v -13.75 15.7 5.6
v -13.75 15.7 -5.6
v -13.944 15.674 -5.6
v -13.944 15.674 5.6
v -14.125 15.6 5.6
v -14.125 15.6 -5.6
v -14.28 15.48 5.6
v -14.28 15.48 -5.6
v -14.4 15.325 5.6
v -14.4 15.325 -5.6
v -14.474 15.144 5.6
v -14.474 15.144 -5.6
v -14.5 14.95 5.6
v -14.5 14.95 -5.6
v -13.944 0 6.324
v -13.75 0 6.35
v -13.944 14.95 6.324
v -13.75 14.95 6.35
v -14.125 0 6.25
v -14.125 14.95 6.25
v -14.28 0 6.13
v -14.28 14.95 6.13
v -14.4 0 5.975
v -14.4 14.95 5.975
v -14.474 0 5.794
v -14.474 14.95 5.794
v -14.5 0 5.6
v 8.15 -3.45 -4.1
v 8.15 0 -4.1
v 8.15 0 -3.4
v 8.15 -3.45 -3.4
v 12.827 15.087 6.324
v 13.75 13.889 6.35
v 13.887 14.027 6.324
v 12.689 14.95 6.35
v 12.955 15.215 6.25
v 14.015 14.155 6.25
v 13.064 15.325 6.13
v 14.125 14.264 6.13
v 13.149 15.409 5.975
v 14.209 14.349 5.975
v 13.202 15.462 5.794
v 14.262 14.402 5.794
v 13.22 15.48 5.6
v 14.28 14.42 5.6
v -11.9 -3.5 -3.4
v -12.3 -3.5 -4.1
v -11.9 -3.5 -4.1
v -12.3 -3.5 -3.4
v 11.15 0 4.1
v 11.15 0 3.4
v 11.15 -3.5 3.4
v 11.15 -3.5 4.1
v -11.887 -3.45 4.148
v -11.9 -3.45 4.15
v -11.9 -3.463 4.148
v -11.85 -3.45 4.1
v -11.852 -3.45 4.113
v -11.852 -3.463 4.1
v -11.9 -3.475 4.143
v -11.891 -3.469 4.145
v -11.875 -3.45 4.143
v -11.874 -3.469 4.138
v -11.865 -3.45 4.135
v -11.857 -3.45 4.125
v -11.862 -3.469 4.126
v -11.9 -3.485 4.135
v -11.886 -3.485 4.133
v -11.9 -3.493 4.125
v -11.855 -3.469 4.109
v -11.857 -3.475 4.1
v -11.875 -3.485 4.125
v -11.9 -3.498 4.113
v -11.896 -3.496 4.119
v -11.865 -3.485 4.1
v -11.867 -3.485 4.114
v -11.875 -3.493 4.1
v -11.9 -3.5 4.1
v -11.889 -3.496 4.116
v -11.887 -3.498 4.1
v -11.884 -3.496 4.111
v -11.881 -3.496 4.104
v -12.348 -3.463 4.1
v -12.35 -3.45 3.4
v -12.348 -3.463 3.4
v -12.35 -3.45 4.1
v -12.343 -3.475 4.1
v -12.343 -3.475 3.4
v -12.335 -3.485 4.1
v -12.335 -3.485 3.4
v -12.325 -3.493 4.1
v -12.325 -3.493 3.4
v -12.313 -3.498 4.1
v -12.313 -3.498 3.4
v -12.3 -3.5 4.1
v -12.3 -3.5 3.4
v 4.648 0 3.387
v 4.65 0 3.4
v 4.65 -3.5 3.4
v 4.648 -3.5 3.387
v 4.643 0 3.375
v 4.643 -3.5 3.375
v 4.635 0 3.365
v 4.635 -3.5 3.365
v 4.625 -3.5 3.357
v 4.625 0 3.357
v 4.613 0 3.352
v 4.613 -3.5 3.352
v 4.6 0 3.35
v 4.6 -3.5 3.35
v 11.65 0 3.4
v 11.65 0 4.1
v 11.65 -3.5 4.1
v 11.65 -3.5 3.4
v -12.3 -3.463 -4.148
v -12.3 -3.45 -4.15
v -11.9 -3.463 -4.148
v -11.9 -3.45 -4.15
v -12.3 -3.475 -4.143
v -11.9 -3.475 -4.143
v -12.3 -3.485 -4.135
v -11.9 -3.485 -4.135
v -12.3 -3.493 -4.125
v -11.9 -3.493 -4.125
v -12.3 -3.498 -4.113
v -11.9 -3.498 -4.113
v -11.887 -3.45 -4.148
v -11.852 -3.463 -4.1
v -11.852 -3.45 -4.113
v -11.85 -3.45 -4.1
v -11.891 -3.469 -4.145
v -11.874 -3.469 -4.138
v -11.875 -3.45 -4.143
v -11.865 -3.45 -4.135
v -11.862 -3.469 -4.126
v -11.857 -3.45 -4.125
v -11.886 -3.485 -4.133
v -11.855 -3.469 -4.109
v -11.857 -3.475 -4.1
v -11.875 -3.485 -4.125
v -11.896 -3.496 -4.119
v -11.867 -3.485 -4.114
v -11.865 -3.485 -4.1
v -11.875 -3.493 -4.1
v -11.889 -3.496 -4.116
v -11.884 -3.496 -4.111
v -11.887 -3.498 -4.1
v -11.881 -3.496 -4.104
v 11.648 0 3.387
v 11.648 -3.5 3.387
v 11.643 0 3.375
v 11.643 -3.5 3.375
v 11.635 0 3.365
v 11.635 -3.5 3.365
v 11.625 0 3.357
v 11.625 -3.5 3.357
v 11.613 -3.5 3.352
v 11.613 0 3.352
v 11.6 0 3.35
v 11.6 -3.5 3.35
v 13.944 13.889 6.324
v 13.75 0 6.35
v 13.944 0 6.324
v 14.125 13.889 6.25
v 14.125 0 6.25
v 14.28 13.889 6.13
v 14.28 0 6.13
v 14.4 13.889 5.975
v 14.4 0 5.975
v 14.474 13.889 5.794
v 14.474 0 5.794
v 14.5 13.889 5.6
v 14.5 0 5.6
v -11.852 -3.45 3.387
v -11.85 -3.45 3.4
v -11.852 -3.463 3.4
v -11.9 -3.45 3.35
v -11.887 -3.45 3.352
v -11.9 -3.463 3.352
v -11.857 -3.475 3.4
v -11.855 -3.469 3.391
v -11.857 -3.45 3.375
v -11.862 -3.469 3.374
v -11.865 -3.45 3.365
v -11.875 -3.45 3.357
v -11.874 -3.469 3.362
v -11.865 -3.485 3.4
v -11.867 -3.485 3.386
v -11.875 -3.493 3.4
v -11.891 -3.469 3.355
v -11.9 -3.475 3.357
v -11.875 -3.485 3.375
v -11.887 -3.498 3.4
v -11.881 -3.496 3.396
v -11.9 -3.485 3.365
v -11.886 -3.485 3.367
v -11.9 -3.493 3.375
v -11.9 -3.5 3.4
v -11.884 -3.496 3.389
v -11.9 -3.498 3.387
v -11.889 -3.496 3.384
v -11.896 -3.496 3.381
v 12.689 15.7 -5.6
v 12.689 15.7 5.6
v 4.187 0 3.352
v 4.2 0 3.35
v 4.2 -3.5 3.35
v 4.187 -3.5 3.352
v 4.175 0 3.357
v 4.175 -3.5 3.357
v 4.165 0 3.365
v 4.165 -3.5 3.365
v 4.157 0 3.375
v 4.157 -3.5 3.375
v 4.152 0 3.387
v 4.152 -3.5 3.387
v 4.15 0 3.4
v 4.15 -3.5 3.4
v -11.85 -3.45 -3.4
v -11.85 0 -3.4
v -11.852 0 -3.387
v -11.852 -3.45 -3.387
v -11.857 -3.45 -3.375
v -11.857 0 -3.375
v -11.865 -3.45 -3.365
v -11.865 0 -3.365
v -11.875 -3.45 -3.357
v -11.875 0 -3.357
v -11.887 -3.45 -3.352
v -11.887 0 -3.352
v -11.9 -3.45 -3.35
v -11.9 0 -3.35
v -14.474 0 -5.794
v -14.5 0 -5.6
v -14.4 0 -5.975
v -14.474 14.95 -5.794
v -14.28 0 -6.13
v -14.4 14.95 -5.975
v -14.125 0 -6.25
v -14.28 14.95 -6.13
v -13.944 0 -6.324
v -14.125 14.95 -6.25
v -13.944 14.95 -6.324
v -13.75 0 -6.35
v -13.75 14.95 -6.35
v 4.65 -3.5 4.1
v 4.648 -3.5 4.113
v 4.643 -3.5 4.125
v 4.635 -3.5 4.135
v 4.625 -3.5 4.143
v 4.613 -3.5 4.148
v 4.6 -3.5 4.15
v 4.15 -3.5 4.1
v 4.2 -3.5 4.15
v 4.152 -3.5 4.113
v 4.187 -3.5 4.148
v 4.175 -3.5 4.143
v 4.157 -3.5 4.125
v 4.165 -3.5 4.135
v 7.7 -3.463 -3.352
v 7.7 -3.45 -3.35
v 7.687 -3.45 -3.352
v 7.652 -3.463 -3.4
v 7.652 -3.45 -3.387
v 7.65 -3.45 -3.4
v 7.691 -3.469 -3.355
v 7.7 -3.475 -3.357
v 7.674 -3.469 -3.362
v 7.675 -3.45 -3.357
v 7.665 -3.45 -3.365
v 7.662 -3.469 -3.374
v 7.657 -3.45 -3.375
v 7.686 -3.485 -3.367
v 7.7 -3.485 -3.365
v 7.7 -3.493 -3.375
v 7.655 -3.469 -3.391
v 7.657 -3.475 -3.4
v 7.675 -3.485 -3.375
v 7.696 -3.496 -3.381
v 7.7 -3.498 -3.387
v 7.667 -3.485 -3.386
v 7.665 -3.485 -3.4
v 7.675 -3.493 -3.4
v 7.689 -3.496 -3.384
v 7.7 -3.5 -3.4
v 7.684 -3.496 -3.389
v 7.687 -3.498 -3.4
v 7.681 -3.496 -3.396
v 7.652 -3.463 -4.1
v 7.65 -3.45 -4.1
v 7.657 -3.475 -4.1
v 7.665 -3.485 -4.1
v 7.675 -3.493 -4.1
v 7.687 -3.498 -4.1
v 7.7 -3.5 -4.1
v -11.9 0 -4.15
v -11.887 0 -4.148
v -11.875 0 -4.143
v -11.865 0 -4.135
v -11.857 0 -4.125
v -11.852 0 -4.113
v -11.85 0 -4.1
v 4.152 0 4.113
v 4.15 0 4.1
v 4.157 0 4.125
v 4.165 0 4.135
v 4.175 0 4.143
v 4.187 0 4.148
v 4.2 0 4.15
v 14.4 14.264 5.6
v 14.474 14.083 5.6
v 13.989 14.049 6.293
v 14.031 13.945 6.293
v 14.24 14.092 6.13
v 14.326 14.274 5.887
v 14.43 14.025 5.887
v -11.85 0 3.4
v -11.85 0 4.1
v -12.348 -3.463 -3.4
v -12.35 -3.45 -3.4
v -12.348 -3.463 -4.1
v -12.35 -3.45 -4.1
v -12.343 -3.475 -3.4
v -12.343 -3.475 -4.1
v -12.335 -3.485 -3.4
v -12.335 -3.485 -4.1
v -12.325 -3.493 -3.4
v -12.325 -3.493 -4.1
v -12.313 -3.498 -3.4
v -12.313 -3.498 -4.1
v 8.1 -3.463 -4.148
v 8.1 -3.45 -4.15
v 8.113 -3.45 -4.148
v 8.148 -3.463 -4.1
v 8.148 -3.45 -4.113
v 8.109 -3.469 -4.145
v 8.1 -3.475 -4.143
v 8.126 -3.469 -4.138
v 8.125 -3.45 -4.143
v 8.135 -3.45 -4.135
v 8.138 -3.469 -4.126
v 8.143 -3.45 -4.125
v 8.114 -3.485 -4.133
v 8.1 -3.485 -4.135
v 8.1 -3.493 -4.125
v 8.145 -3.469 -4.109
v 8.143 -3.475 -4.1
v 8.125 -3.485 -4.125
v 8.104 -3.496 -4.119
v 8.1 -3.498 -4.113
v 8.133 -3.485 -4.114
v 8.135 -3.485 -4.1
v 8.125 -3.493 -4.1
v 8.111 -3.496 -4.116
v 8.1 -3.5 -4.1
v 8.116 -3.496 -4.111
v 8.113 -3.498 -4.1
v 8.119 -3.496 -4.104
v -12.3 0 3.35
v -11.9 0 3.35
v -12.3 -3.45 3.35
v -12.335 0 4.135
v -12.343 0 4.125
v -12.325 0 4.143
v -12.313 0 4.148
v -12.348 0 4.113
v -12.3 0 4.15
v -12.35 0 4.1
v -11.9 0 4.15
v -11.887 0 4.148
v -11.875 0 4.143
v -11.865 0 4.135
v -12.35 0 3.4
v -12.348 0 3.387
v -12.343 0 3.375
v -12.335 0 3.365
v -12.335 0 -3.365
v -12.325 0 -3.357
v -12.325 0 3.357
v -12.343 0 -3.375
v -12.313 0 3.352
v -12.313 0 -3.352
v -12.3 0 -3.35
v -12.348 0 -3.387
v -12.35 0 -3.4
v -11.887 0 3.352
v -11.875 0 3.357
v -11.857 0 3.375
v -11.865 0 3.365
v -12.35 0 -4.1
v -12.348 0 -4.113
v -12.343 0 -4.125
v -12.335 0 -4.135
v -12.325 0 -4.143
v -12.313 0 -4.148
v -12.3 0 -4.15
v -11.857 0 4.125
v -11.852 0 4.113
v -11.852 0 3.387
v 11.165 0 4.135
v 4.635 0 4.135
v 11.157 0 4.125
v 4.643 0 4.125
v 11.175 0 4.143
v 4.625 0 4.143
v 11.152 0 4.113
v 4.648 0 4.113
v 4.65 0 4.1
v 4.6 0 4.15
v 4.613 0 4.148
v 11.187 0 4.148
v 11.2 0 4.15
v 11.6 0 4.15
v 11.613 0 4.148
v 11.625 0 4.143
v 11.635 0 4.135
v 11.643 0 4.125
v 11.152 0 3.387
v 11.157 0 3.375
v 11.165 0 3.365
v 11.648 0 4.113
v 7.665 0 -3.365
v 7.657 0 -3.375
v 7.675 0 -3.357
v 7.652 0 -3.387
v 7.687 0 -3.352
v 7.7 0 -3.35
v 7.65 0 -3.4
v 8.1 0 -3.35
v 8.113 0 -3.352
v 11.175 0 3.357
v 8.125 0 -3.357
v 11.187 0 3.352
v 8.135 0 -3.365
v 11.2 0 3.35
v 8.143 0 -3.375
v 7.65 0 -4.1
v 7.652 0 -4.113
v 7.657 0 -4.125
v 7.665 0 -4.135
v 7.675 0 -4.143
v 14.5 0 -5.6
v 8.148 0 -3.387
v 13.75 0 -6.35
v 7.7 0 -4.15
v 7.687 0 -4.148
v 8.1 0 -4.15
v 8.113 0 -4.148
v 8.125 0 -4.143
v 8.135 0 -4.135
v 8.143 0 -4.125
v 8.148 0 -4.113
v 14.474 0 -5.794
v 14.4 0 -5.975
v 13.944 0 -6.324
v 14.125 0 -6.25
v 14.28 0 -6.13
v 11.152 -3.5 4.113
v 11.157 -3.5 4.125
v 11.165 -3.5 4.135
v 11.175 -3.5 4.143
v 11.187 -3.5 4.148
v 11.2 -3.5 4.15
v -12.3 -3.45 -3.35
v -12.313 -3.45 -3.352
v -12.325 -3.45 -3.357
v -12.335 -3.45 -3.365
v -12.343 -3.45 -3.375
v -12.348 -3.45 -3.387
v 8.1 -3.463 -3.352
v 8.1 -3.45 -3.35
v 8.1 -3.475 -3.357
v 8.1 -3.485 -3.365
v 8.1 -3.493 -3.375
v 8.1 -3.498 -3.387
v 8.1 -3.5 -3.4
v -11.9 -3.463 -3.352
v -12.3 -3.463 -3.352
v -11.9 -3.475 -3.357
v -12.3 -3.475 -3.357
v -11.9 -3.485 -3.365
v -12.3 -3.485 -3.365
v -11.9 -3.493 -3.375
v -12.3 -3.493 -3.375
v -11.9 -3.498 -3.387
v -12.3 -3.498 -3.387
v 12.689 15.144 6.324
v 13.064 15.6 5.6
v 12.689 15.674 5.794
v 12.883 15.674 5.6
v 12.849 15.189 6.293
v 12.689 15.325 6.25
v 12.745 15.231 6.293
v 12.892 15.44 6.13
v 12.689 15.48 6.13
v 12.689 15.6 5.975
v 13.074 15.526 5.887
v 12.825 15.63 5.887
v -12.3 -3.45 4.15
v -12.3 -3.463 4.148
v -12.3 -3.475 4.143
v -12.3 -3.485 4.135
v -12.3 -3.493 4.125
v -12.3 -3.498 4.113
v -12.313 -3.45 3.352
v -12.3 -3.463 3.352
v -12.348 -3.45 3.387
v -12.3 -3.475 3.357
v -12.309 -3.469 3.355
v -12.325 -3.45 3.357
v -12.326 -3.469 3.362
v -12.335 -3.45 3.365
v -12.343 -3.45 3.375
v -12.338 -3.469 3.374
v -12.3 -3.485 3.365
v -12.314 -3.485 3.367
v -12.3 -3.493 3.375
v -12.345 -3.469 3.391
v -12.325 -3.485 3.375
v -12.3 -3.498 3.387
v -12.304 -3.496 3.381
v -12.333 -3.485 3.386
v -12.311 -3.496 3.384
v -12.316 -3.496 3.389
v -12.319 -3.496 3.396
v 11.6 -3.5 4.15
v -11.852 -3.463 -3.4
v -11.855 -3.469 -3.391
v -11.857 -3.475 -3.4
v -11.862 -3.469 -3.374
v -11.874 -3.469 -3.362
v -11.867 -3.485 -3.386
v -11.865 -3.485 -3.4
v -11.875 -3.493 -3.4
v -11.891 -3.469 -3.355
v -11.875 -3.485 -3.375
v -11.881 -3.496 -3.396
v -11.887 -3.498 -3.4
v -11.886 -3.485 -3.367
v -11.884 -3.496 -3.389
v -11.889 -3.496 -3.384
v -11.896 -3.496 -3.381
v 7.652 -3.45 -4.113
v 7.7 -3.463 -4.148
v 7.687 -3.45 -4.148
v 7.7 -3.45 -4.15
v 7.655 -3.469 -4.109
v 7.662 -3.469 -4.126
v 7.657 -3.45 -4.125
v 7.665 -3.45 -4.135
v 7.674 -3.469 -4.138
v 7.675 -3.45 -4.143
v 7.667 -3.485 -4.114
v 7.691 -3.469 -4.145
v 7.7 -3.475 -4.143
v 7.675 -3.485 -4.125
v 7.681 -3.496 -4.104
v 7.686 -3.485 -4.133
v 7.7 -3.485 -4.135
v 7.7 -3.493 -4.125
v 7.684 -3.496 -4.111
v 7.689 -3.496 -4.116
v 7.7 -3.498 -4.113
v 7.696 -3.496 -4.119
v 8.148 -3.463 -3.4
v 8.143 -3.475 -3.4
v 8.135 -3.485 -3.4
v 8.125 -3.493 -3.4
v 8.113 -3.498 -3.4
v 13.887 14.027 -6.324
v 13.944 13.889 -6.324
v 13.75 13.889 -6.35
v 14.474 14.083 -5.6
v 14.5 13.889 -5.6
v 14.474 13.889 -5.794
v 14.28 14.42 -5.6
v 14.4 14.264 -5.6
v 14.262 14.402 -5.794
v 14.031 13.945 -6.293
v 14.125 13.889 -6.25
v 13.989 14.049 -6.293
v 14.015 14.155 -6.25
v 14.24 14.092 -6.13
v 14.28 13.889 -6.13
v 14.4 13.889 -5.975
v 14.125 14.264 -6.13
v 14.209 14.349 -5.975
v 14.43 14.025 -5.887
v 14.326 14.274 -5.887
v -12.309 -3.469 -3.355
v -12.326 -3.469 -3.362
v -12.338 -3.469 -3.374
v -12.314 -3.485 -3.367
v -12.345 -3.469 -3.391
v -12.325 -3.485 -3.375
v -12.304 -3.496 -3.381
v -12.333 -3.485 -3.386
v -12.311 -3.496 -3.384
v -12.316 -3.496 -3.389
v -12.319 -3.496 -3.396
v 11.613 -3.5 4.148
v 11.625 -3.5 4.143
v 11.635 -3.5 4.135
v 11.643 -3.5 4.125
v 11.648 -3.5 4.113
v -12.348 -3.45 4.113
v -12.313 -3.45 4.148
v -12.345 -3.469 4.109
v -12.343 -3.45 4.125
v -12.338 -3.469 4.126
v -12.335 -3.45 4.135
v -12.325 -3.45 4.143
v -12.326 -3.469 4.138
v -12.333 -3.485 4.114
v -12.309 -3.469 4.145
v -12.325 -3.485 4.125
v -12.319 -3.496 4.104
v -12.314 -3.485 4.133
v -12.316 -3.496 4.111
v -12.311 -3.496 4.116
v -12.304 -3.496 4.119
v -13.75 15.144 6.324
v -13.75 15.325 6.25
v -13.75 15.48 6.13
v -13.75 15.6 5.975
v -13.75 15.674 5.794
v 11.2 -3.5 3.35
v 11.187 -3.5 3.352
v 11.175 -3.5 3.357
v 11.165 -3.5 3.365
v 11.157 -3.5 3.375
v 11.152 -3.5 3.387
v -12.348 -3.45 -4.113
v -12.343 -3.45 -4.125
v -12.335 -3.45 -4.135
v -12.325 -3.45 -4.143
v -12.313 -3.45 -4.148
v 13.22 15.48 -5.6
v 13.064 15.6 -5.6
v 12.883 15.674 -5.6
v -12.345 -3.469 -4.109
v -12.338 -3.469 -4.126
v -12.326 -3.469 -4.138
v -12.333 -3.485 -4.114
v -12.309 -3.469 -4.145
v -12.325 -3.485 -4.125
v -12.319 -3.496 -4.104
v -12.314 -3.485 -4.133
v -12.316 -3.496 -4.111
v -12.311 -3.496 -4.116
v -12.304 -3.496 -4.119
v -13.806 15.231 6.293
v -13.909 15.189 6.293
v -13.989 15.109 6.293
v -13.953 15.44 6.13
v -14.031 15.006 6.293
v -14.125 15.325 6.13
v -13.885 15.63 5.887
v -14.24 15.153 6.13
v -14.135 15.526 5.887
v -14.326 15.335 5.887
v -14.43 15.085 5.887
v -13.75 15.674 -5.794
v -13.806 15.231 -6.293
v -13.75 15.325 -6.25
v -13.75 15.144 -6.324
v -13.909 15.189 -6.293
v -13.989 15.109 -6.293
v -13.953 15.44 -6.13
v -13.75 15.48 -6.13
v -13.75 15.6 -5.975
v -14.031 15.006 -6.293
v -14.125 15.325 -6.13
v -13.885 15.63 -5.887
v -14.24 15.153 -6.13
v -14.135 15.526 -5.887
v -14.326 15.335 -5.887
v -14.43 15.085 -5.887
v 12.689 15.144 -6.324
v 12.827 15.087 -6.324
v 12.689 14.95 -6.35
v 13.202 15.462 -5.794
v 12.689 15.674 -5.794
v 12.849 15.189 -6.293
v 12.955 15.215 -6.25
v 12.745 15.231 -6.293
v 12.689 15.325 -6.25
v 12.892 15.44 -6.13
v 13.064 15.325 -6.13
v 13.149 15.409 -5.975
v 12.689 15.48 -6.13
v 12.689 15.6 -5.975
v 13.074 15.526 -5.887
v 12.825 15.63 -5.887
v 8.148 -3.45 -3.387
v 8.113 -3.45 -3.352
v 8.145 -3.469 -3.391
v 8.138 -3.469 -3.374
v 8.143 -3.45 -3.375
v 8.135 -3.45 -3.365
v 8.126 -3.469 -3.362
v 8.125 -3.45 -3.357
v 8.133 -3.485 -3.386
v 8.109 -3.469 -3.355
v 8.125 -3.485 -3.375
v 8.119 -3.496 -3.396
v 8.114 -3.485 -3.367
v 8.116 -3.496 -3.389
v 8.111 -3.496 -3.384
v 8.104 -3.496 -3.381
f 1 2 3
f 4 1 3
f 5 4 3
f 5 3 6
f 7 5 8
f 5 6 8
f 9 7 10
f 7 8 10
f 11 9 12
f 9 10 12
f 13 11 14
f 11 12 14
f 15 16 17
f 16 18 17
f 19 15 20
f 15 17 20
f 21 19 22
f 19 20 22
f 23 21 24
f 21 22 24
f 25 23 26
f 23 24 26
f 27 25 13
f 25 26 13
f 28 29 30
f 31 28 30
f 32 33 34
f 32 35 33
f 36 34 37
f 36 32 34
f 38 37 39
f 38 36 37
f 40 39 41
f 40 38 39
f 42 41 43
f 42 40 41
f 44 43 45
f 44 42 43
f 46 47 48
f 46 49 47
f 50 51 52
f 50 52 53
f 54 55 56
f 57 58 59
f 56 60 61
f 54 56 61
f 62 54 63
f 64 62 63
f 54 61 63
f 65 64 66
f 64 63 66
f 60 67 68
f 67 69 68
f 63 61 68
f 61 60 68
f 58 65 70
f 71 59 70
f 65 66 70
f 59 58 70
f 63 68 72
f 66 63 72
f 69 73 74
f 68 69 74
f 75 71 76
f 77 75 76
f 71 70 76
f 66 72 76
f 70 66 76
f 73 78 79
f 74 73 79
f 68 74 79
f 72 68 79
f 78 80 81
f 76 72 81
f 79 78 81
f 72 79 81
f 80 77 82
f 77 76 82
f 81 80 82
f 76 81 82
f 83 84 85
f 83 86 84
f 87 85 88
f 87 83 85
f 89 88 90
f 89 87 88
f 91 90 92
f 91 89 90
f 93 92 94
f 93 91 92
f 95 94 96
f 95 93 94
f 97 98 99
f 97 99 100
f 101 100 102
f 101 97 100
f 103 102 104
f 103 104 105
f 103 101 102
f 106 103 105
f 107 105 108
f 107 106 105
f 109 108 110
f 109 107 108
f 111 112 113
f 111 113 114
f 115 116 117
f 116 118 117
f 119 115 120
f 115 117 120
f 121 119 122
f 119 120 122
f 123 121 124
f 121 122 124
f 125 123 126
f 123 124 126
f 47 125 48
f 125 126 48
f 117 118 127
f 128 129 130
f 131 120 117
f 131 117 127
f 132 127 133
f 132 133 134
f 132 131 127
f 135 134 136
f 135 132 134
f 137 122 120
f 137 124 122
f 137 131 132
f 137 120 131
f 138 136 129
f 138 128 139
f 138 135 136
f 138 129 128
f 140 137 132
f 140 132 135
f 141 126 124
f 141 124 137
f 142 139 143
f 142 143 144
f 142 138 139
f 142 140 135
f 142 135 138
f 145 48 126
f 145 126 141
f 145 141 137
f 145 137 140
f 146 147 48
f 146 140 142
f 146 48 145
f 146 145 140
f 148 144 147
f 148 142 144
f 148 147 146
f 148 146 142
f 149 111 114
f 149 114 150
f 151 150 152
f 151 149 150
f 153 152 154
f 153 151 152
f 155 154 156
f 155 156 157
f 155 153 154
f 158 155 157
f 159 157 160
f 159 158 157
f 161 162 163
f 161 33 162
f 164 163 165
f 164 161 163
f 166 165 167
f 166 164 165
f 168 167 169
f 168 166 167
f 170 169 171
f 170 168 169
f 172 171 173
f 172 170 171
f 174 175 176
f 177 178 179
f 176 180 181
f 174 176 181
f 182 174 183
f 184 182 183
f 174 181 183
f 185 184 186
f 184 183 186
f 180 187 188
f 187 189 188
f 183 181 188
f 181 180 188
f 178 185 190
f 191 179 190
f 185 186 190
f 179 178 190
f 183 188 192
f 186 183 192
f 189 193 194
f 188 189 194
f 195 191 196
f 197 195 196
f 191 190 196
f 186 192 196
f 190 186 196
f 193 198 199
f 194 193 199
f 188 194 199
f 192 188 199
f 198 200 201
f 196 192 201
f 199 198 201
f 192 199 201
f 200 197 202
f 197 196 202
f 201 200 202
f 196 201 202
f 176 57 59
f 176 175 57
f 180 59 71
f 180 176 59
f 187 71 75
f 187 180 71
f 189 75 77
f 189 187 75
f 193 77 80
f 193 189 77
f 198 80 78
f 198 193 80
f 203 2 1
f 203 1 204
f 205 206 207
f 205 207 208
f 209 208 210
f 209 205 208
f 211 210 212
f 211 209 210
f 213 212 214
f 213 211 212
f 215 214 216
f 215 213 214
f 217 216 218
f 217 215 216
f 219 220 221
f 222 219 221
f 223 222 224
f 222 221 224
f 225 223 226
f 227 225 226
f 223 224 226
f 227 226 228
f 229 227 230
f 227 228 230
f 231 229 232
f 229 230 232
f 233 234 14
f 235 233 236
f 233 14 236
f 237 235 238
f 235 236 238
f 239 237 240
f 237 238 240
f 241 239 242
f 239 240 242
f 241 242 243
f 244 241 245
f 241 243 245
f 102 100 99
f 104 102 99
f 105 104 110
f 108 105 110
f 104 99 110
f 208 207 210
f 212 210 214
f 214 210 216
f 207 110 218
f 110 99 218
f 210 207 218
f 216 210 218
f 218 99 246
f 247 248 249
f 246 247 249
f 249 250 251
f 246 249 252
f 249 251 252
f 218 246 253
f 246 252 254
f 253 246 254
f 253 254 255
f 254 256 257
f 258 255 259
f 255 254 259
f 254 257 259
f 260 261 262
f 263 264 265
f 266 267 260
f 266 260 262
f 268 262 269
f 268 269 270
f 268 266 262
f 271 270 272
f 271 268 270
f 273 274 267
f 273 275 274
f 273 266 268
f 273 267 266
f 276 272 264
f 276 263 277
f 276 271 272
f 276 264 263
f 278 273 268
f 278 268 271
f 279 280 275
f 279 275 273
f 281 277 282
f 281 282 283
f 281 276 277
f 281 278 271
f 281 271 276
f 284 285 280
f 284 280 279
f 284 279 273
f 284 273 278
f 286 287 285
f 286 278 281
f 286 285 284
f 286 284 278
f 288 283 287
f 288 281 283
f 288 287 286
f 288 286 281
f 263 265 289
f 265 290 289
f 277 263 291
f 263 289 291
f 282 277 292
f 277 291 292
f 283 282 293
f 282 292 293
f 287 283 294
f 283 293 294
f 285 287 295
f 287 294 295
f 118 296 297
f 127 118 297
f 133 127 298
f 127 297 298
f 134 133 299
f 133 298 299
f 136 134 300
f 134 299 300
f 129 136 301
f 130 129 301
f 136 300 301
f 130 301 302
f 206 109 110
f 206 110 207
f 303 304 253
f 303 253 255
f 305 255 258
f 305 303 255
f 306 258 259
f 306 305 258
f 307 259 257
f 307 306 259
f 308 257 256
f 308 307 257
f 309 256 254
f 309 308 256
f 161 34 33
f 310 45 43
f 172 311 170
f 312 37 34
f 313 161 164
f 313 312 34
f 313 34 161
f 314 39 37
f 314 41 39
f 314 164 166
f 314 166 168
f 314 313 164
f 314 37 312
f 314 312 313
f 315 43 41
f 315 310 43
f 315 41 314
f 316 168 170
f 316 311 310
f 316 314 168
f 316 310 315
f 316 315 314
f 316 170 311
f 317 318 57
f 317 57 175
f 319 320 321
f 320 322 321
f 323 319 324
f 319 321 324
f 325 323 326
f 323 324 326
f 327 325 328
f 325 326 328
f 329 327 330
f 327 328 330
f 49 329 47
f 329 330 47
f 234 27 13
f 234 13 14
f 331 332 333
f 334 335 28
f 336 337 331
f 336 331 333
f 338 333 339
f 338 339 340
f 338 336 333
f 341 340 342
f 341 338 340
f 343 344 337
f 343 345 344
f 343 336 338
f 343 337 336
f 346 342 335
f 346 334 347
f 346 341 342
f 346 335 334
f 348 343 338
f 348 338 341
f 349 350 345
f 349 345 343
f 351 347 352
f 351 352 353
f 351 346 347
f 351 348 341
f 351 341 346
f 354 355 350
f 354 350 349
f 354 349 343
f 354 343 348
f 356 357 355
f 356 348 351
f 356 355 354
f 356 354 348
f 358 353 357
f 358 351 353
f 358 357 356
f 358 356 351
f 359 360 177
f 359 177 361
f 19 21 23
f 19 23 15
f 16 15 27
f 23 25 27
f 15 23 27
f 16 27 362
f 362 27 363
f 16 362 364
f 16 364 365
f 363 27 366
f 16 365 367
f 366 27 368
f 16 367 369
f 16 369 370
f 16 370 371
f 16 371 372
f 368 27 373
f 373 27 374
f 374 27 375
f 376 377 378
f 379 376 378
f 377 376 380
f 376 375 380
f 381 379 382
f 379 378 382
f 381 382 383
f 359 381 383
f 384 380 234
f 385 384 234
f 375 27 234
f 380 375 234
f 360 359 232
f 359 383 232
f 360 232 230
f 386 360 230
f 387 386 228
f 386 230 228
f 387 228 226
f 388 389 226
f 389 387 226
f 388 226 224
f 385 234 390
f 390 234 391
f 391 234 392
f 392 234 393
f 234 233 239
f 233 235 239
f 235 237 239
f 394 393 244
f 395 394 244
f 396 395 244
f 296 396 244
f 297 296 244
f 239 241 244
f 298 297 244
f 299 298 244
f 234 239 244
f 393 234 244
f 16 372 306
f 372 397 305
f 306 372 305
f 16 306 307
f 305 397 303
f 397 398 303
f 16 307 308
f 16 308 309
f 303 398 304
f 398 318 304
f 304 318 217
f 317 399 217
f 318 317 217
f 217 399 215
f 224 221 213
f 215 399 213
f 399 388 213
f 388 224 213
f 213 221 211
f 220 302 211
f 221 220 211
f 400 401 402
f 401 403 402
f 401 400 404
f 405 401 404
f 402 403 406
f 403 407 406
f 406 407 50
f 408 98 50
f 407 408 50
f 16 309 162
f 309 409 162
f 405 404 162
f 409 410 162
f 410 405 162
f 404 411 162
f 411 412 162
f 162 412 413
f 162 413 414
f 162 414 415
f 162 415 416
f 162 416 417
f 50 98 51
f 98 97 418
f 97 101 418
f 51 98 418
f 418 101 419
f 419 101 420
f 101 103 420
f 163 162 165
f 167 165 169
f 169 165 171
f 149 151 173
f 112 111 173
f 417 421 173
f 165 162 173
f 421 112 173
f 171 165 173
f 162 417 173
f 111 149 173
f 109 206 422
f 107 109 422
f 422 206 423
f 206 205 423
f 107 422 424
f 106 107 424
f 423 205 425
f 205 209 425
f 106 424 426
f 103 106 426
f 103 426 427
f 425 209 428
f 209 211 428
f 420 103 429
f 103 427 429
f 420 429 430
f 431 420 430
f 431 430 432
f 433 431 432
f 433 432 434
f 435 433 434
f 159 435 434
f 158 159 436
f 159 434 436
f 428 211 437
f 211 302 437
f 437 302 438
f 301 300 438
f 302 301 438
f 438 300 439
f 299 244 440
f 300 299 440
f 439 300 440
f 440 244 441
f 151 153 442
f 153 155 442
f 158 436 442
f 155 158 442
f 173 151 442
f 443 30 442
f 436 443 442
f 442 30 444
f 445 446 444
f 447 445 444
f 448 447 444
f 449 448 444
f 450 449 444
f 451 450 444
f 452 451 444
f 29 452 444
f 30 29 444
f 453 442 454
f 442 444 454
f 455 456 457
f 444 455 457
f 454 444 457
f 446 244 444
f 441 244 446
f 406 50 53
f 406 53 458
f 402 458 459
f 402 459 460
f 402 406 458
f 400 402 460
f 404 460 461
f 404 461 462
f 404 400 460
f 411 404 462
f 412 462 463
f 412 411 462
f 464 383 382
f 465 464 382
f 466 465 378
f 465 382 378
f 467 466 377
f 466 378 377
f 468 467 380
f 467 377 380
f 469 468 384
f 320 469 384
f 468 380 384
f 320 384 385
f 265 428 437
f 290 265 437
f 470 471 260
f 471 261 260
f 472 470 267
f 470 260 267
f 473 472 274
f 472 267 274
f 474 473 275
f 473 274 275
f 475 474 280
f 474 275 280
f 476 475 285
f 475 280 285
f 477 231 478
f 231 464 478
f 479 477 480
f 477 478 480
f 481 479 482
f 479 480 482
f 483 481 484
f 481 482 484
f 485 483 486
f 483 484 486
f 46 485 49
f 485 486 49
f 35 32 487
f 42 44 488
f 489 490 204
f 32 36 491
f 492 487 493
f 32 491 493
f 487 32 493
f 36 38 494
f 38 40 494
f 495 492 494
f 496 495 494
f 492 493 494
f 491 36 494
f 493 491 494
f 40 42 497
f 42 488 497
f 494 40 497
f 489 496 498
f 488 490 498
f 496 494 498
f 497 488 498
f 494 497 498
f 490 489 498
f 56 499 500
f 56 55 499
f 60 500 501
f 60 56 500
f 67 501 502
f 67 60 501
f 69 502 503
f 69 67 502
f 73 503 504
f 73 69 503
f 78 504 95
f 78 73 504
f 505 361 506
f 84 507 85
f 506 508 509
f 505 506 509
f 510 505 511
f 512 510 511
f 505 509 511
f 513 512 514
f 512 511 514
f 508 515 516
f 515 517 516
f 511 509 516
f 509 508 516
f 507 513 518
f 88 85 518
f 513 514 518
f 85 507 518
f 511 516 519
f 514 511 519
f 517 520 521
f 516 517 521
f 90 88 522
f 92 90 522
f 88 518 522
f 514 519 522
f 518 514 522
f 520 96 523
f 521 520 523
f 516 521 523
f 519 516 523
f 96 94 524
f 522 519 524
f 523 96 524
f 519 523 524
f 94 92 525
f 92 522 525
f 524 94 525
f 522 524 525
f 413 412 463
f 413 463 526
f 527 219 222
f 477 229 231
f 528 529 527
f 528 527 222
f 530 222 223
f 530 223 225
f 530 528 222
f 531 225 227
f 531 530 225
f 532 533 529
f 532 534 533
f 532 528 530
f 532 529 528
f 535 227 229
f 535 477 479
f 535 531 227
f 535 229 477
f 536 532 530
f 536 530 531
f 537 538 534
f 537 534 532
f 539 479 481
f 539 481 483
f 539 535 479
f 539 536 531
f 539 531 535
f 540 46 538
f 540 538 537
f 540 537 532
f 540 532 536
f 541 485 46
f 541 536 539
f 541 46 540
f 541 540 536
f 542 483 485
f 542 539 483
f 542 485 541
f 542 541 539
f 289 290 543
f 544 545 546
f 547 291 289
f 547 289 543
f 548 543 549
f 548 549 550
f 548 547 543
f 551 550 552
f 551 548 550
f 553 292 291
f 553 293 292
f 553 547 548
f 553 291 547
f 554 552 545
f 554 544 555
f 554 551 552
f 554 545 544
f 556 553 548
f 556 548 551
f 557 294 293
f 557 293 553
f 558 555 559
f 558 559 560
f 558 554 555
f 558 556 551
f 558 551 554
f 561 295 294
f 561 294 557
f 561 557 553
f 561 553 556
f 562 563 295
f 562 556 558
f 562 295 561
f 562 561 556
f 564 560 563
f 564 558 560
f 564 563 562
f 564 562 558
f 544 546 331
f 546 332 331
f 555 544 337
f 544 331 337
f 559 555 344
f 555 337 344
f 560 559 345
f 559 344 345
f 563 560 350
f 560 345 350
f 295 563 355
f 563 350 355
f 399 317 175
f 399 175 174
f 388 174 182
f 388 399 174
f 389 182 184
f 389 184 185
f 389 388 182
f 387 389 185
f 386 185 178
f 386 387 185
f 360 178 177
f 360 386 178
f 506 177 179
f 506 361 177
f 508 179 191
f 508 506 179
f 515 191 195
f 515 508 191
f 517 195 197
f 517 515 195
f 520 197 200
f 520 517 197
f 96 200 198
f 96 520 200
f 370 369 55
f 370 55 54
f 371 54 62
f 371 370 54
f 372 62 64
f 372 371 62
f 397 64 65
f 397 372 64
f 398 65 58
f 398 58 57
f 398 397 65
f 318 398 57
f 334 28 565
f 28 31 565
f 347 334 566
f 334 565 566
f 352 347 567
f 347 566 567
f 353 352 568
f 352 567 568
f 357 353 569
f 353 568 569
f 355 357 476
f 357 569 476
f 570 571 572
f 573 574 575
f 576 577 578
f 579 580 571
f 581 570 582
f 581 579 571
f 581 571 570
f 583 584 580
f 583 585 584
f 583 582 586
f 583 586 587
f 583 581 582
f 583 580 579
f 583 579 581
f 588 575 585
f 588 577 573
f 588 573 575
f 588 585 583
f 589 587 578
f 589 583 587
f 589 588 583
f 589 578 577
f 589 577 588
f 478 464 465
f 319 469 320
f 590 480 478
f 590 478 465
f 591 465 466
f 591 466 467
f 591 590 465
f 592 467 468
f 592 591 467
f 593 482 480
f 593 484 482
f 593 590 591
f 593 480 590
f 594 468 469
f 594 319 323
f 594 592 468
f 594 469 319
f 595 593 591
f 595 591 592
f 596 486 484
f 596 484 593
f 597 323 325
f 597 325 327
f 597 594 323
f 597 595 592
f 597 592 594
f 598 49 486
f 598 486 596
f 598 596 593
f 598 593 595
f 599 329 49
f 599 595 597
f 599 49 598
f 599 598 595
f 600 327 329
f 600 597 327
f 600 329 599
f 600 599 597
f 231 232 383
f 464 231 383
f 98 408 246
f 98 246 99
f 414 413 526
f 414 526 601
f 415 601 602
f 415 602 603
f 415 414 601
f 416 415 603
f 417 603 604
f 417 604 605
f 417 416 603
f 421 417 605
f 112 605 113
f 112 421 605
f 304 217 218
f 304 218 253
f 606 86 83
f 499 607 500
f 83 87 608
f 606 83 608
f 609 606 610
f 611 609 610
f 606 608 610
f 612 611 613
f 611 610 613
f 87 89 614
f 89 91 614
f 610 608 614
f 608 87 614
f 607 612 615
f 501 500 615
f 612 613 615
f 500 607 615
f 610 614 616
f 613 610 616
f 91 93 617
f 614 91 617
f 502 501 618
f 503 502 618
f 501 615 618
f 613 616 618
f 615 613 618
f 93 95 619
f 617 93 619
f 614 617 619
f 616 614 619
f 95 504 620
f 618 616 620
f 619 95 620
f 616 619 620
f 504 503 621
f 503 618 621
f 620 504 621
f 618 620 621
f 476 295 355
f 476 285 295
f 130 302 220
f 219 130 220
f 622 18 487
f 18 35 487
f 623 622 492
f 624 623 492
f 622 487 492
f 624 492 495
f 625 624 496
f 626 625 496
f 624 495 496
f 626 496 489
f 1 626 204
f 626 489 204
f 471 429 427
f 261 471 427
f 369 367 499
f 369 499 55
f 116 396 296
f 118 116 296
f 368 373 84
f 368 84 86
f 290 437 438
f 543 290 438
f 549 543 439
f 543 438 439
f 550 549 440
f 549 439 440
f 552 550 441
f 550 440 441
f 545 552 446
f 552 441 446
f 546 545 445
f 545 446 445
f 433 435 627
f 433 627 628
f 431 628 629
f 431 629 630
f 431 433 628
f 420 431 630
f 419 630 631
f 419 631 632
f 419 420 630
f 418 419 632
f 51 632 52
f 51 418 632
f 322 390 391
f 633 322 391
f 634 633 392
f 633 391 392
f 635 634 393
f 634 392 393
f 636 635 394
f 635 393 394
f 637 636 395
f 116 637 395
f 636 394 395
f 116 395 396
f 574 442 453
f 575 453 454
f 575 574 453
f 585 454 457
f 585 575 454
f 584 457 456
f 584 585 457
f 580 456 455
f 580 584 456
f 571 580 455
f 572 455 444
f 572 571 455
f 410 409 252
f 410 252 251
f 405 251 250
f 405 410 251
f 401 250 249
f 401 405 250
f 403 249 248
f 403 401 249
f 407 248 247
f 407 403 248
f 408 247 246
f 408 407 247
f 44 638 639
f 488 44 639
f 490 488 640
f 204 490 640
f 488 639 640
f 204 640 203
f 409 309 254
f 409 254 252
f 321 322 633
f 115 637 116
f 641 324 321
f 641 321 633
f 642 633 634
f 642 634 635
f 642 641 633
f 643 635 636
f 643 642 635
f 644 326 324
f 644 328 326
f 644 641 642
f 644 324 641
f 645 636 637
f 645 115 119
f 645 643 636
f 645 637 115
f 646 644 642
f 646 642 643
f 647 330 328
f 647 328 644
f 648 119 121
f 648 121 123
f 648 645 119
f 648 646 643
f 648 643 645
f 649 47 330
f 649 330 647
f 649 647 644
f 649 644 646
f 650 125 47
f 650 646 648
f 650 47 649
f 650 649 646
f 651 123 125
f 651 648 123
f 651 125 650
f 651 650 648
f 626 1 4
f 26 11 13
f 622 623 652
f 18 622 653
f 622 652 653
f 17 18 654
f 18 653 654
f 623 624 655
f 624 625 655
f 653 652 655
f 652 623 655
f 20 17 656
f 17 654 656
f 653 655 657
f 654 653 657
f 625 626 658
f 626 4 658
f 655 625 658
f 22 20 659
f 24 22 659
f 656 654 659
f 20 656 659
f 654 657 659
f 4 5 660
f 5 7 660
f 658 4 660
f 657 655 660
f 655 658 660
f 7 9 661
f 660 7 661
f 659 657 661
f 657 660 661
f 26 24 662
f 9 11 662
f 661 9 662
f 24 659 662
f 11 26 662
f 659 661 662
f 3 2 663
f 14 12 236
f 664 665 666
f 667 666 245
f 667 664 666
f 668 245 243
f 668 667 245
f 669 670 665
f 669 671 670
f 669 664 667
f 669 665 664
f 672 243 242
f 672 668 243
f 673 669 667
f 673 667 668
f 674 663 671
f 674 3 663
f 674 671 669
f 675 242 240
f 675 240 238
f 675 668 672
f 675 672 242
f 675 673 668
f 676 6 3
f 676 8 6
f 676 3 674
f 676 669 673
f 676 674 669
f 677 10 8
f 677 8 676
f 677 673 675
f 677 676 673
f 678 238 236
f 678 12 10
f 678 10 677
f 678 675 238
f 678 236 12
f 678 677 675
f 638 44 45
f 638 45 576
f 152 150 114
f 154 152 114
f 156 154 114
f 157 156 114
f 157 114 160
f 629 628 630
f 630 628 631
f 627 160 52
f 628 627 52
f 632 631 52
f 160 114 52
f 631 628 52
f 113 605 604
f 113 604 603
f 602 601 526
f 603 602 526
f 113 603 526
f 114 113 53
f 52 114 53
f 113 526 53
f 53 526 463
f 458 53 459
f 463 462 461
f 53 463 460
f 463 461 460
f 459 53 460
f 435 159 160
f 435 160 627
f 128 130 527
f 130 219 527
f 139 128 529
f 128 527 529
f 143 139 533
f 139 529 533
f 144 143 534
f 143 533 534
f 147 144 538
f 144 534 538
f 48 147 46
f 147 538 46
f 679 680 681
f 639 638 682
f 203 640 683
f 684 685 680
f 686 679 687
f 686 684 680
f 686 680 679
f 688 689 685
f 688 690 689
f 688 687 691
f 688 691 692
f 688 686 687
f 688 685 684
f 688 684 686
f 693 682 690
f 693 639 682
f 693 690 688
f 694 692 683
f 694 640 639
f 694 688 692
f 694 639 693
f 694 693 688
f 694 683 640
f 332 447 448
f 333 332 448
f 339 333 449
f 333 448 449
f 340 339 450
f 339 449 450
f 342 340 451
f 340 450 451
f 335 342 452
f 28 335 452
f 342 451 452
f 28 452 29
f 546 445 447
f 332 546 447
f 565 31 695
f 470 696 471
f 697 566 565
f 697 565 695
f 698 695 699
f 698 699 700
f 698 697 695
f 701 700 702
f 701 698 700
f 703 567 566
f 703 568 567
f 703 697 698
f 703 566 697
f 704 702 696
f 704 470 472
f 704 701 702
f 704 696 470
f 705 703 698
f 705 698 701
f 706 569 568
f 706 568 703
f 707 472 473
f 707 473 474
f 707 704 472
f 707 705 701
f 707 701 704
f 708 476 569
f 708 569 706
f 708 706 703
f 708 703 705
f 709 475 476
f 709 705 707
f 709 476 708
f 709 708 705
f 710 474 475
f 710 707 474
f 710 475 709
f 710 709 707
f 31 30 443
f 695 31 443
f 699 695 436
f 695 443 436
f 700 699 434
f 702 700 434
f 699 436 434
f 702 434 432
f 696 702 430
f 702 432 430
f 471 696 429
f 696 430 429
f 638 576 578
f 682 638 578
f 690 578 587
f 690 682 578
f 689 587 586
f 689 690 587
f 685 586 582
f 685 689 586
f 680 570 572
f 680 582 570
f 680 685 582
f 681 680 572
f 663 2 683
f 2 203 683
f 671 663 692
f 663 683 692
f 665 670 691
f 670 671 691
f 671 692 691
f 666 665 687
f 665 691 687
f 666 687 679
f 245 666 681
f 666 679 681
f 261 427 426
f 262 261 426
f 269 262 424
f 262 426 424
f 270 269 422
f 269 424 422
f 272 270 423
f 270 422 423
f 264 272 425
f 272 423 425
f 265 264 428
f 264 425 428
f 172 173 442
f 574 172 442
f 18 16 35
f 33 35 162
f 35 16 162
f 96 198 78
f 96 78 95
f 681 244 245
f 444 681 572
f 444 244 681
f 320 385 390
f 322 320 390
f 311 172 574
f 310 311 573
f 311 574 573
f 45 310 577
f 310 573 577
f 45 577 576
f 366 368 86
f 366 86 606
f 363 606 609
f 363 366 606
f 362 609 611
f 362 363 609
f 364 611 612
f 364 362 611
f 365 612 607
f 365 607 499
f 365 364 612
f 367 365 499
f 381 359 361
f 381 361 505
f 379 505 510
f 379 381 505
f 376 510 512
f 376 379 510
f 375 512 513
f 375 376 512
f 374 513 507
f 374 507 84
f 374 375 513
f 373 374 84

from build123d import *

# Parameters (mm, degrees)
SKETCH_1_W      = 29
SKETCH_1_H      = 12.7
EXTRUDE_1_DEPTH = 15.7
EXTRUDE_2_DEPTH = 3.5
FILLET_1_R      = 0.05
CHAMFER_1_SIZE  = 1.5
FILLET_2_R      = 0.75


with BuildPart() as part:
    # Эскиз1 → Бобышка-Вытянуть1 (new body)
    with BuildSketch(Plane(origin=(0, 0, 0), x_dir=(1, 0, 0), z_dir=(0, 1, 0))):
        Rectangle(SKETCH_1_W, SKETCH_1_H)
    extrude(amount=EXTRUDE_1_DEPTH)

    # Эскиз2 → Бобышка-Вытянуть2 (add)
    with BuildSketch(Plane.XZ):
        with BuildLine():
            Line((-12.3, 4.15), (-11.9, 4.15))
            ThreePointArc((-11.9, 4.15), (-11.864644661, 4.135355339), (-11.85, 4.1))
            Line((-11.85, 4.1), (-11.85, 3.4))
            ThreePointArc((-11.85, 3.4), (-11.864644661, 3.364644661), (-11.9, 3.35))
            Line((-11.9, 3.35), (-12.3, 3.35))
            ThreePointArc((-12.3, 3.35), (-12.335355339, 3.364644661), (-12.35, 3.4))
            Line((-12.35, 3.4), (-12.35, 4.1))
            ThreePointArc((-12.35, 4.1), (-12.335355339, 4.135355339), (-12.3, 4.15))
        make_face()
        with BuildLine():
            Line((7.65, -3.4), (7.65, -4.1))
            ThreePointArc((7.65, -4.1), (7.664644661, -4.135355339), (7.7, -4.15))
            Line((7.7, -4.15), (8.1, -4.15))
            ThreePointArc((8.1, -4.15), (8.135355339, -4.135355339), (8.15, -4.1))
            Line((8.15, -4.1), (8.15, -3.4))
            ThreePointArc((8.15, -3.4), (8.135355339, -3.364644661), (8.1, -3.35))
            Line((8.1, -3.35), (7.7, -3.35))
            ThreePointArc((7.7, -3.35), (7.664644661, -3.364644661), (7.65, -3.4))
        make_face()
        with BuildLine():
            Line((-12.35, -3.4), (-12.35, -4.1))
            ThreePointArc((-12.35, -4.1), (-12.335355339, -4.135355339), (-12.3, -4.15))
            Line((-12.3, -4.15), (-11.9, -4.15))
            ThreePointArc((-11.9, -4.15), (-11.864644661, -4.135355339), (-11.85, -4.1))
            Line((-11.85, -4.1), (-11.85, -3.4))
            ThreePointArc((-11.85, -3.4), (-11.864644661, -3.364644661), (-11.9, -3.35))
            Line((-11.9, -3.35), (-12.3, -3.35))
            ThreePointArc((-12.3, -3.35), (-12.335355339, -3.364644661), (-12.35, -3.4))
        make_face()
        with BuildLine():
            Line((11.2, 4.15), (11.6, 4.15))
            ThreePointArc((11.6, 4.15), (11.635355339, 4.135355339), (11.65, 4.1))
            Line((11.65, 4.1), (11.65, 3.4))
            ThreePointArc((11.65, 3.4), (11.635355339, 3.364644661), (11.6, 3.35))
            Line((11.6, 3.35), (11.2, 3.35))
            ThreePointArc((11.2, 3.35), (11.164644661, 3.364644661), (11.15, 3.4))
            Line((11.15, 3.4), (11.15, 4.1))
            ThreePointArc((11.15, 4.1), (11.164644661, 4.135355339), (11.2, 4.15))
        make_face()
        with BuildLine():
            Line((4.2, 4.15), (4.6, 4.15))
            ThreePointArc((4.6, 4.15), (4.635355339, 4.135355339), (4.65, 4.1))
            Line((4.65, 4.1), (4.65, 3.4))
            ThreePointArc((4.65, 3.4), (4.635355339, 3.364644661), (4.6, 3.35))
            Line((4.6, 3.35), (4.2, 3.35))
            ThreePointArc((4.2, 3.35), (4.164644661, 3.364644661), (4.15, 3.4))
            Line((4.15, 3.4), (4.15, 4.1))
            ThreePointArc((4.15, 4.1), (4.164644661, 4.135355339), (4.2, 4.15))
        make_face()
    extrude(amount=EXTRUDE_2_DEPTH)

    # Скругление1
    fillet_1_edges = [part.edges().sort_by_distance(p)[0] for p in [
        (-12.335355339, -3.5, -4.135355339),
        (-12.1, -3.5, -4.15),
        (-11.864644661, -3.5, -4.135355339),
        (-11.85, -3.5, -3.75),
        (-11.864644661, -3.5, -3.364644661),
        (-12.1, -3.5, -3.35),
        (-12.335355339, -3.5, -3.364644661),
        (-12.35, -3.5, -3.75),
        (-12.335355339, -3.5, 3.364644661),
        (-12.1, -3.5, 3.35),
        (-11.864644661, -3.5, 3.364644661),
        (-11.85, -3.5, 3.75),
        (-11.864644661, -3.5, 4.135355339),
        (-12.1, -3.5, 4.15),
        (-12.335355339, -3.5, 4.135355339),
        (-12.35, -3.5, 3.75),
        (7.664644661, -3.5, -4.135355339),
        (7.9, -3.5, -4.15),
        (8.135355339, -3.5, -4.135355339),
        (8.15, -3.5, -3.75),
        (8.135355339, -3.5, -3.364644661),
        (7.9, -3.5, -3.35),
        (7.664644661, -3.5, -3.364644661),
        (7.65, -3.5, -3.75),
    ]]
    fillet(fillet_1_edges, radius=FILLET_1_R)

    # Фаска1
    chamfer_1_edges = [part.edges().sort_by_distance(p)[0] for p in [
        (14.5, 15.7, 0),
    ]]
    chamfer(chamfer_1_edges, length=CHAMFER_1_SIZE)

    # Скругление2
    fillet_2_edges = [part.edges().sort_by_distance(p)[0] for p in [
        (-14.5, 15.7, 0),
        (-0.75, 15.7, 6.35),
        (-0.75, 15.7, -6.35),
        (13, 15.7, 0),
        (14.5, 7.1, -6.35),
        (13.75, 14.95, -6.35),
        (14.5, 7.1, 6.35),
        (14.5, 14.2, 0),
        (13.75, 14.95, 6.35),
        (-14.5, 7.85, 6.35),
        (-14.5, 7.85, -6.35),
    ]]
    fillet(fillet_2_edges, radius=FILLET_2_R)


solid = part.part
